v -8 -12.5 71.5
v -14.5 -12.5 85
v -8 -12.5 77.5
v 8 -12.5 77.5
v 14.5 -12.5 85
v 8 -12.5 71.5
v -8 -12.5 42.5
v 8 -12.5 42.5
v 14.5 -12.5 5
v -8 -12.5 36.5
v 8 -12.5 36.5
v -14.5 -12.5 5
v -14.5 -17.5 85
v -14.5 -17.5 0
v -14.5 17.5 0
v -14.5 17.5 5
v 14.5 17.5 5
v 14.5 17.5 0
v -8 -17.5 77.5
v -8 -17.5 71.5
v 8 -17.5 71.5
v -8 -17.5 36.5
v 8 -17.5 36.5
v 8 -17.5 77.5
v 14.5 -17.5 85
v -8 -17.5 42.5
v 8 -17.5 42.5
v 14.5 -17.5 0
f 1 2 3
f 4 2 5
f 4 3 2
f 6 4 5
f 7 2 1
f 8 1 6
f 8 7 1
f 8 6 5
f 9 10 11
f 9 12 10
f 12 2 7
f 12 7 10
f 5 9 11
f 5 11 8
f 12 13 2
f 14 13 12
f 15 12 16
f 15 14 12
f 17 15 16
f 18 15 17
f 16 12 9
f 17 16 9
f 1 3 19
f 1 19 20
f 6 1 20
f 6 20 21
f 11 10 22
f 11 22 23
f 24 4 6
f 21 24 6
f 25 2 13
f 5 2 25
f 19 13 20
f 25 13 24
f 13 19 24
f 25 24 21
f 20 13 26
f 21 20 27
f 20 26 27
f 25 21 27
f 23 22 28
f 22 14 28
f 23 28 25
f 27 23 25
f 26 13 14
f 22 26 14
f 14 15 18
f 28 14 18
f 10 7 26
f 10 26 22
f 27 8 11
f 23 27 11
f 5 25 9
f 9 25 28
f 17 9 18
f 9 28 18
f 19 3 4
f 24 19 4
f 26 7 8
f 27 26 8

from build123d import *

# Parameters (mm, degrees)
SCHIZZO1_W                   = 29
SCHIZZO1_H                   = 35
ESTRUSIONE_ESTRUSIONE1_DEPTH = 5
SCHIZZO2_W                   = 29
SCHIZZO2_H                   = 5
ESTRUSIONE_ESTRUSIONE2_DEPTH = 80
SCHIZZO4_W                   = 16
SCHIZZO4_H                   = 6
TAGLIO_ESTRUSIONE2_DEPTH     = 10


with BuildPart() as part:
    # Schizzo1 → Estrusione-Estrusione1 (new body)
    with BuildSketch(Plane.XY):
        Rectangle(SCHIZZO1_W, SCHIZZO1_H)
    extrude(amount=ESTRUSIONE_ESTRUSIONE1_DEPTH)

    # Schizzo2 → Estrusione-Estrusione2 (add)
    with BuildSketch(Plane.XY.offset(5)):
        with Locations((0, -15)):
            Rectangle(SCHIZZO2_W, SCHIZZO2_H)
    extrude(amount=ESTRUSIONE_ESTRUSIONE2_DEPTH)

    # Schizzo4 → Taglio-Estrusione2 (cut)
    with BuildSketch(Plane(origin=(0, -12.5, 0), x_dir=(1, 0, 0), z_dir=(0, 1, 0))):
        with Locations((0, -39.5)):
            Rectangle(SCHIZZO4_W, SCHIZZO4_H)
        with Locations((0, -74.5)):
            Rectangle(SCHIZZO4_W, SCHIZZO4_H)
    extrude(amount=-TAGLIO_ESTRUSIONE2_DEPTH, mode=Mode.SUBTRACT)


solid = part.part
